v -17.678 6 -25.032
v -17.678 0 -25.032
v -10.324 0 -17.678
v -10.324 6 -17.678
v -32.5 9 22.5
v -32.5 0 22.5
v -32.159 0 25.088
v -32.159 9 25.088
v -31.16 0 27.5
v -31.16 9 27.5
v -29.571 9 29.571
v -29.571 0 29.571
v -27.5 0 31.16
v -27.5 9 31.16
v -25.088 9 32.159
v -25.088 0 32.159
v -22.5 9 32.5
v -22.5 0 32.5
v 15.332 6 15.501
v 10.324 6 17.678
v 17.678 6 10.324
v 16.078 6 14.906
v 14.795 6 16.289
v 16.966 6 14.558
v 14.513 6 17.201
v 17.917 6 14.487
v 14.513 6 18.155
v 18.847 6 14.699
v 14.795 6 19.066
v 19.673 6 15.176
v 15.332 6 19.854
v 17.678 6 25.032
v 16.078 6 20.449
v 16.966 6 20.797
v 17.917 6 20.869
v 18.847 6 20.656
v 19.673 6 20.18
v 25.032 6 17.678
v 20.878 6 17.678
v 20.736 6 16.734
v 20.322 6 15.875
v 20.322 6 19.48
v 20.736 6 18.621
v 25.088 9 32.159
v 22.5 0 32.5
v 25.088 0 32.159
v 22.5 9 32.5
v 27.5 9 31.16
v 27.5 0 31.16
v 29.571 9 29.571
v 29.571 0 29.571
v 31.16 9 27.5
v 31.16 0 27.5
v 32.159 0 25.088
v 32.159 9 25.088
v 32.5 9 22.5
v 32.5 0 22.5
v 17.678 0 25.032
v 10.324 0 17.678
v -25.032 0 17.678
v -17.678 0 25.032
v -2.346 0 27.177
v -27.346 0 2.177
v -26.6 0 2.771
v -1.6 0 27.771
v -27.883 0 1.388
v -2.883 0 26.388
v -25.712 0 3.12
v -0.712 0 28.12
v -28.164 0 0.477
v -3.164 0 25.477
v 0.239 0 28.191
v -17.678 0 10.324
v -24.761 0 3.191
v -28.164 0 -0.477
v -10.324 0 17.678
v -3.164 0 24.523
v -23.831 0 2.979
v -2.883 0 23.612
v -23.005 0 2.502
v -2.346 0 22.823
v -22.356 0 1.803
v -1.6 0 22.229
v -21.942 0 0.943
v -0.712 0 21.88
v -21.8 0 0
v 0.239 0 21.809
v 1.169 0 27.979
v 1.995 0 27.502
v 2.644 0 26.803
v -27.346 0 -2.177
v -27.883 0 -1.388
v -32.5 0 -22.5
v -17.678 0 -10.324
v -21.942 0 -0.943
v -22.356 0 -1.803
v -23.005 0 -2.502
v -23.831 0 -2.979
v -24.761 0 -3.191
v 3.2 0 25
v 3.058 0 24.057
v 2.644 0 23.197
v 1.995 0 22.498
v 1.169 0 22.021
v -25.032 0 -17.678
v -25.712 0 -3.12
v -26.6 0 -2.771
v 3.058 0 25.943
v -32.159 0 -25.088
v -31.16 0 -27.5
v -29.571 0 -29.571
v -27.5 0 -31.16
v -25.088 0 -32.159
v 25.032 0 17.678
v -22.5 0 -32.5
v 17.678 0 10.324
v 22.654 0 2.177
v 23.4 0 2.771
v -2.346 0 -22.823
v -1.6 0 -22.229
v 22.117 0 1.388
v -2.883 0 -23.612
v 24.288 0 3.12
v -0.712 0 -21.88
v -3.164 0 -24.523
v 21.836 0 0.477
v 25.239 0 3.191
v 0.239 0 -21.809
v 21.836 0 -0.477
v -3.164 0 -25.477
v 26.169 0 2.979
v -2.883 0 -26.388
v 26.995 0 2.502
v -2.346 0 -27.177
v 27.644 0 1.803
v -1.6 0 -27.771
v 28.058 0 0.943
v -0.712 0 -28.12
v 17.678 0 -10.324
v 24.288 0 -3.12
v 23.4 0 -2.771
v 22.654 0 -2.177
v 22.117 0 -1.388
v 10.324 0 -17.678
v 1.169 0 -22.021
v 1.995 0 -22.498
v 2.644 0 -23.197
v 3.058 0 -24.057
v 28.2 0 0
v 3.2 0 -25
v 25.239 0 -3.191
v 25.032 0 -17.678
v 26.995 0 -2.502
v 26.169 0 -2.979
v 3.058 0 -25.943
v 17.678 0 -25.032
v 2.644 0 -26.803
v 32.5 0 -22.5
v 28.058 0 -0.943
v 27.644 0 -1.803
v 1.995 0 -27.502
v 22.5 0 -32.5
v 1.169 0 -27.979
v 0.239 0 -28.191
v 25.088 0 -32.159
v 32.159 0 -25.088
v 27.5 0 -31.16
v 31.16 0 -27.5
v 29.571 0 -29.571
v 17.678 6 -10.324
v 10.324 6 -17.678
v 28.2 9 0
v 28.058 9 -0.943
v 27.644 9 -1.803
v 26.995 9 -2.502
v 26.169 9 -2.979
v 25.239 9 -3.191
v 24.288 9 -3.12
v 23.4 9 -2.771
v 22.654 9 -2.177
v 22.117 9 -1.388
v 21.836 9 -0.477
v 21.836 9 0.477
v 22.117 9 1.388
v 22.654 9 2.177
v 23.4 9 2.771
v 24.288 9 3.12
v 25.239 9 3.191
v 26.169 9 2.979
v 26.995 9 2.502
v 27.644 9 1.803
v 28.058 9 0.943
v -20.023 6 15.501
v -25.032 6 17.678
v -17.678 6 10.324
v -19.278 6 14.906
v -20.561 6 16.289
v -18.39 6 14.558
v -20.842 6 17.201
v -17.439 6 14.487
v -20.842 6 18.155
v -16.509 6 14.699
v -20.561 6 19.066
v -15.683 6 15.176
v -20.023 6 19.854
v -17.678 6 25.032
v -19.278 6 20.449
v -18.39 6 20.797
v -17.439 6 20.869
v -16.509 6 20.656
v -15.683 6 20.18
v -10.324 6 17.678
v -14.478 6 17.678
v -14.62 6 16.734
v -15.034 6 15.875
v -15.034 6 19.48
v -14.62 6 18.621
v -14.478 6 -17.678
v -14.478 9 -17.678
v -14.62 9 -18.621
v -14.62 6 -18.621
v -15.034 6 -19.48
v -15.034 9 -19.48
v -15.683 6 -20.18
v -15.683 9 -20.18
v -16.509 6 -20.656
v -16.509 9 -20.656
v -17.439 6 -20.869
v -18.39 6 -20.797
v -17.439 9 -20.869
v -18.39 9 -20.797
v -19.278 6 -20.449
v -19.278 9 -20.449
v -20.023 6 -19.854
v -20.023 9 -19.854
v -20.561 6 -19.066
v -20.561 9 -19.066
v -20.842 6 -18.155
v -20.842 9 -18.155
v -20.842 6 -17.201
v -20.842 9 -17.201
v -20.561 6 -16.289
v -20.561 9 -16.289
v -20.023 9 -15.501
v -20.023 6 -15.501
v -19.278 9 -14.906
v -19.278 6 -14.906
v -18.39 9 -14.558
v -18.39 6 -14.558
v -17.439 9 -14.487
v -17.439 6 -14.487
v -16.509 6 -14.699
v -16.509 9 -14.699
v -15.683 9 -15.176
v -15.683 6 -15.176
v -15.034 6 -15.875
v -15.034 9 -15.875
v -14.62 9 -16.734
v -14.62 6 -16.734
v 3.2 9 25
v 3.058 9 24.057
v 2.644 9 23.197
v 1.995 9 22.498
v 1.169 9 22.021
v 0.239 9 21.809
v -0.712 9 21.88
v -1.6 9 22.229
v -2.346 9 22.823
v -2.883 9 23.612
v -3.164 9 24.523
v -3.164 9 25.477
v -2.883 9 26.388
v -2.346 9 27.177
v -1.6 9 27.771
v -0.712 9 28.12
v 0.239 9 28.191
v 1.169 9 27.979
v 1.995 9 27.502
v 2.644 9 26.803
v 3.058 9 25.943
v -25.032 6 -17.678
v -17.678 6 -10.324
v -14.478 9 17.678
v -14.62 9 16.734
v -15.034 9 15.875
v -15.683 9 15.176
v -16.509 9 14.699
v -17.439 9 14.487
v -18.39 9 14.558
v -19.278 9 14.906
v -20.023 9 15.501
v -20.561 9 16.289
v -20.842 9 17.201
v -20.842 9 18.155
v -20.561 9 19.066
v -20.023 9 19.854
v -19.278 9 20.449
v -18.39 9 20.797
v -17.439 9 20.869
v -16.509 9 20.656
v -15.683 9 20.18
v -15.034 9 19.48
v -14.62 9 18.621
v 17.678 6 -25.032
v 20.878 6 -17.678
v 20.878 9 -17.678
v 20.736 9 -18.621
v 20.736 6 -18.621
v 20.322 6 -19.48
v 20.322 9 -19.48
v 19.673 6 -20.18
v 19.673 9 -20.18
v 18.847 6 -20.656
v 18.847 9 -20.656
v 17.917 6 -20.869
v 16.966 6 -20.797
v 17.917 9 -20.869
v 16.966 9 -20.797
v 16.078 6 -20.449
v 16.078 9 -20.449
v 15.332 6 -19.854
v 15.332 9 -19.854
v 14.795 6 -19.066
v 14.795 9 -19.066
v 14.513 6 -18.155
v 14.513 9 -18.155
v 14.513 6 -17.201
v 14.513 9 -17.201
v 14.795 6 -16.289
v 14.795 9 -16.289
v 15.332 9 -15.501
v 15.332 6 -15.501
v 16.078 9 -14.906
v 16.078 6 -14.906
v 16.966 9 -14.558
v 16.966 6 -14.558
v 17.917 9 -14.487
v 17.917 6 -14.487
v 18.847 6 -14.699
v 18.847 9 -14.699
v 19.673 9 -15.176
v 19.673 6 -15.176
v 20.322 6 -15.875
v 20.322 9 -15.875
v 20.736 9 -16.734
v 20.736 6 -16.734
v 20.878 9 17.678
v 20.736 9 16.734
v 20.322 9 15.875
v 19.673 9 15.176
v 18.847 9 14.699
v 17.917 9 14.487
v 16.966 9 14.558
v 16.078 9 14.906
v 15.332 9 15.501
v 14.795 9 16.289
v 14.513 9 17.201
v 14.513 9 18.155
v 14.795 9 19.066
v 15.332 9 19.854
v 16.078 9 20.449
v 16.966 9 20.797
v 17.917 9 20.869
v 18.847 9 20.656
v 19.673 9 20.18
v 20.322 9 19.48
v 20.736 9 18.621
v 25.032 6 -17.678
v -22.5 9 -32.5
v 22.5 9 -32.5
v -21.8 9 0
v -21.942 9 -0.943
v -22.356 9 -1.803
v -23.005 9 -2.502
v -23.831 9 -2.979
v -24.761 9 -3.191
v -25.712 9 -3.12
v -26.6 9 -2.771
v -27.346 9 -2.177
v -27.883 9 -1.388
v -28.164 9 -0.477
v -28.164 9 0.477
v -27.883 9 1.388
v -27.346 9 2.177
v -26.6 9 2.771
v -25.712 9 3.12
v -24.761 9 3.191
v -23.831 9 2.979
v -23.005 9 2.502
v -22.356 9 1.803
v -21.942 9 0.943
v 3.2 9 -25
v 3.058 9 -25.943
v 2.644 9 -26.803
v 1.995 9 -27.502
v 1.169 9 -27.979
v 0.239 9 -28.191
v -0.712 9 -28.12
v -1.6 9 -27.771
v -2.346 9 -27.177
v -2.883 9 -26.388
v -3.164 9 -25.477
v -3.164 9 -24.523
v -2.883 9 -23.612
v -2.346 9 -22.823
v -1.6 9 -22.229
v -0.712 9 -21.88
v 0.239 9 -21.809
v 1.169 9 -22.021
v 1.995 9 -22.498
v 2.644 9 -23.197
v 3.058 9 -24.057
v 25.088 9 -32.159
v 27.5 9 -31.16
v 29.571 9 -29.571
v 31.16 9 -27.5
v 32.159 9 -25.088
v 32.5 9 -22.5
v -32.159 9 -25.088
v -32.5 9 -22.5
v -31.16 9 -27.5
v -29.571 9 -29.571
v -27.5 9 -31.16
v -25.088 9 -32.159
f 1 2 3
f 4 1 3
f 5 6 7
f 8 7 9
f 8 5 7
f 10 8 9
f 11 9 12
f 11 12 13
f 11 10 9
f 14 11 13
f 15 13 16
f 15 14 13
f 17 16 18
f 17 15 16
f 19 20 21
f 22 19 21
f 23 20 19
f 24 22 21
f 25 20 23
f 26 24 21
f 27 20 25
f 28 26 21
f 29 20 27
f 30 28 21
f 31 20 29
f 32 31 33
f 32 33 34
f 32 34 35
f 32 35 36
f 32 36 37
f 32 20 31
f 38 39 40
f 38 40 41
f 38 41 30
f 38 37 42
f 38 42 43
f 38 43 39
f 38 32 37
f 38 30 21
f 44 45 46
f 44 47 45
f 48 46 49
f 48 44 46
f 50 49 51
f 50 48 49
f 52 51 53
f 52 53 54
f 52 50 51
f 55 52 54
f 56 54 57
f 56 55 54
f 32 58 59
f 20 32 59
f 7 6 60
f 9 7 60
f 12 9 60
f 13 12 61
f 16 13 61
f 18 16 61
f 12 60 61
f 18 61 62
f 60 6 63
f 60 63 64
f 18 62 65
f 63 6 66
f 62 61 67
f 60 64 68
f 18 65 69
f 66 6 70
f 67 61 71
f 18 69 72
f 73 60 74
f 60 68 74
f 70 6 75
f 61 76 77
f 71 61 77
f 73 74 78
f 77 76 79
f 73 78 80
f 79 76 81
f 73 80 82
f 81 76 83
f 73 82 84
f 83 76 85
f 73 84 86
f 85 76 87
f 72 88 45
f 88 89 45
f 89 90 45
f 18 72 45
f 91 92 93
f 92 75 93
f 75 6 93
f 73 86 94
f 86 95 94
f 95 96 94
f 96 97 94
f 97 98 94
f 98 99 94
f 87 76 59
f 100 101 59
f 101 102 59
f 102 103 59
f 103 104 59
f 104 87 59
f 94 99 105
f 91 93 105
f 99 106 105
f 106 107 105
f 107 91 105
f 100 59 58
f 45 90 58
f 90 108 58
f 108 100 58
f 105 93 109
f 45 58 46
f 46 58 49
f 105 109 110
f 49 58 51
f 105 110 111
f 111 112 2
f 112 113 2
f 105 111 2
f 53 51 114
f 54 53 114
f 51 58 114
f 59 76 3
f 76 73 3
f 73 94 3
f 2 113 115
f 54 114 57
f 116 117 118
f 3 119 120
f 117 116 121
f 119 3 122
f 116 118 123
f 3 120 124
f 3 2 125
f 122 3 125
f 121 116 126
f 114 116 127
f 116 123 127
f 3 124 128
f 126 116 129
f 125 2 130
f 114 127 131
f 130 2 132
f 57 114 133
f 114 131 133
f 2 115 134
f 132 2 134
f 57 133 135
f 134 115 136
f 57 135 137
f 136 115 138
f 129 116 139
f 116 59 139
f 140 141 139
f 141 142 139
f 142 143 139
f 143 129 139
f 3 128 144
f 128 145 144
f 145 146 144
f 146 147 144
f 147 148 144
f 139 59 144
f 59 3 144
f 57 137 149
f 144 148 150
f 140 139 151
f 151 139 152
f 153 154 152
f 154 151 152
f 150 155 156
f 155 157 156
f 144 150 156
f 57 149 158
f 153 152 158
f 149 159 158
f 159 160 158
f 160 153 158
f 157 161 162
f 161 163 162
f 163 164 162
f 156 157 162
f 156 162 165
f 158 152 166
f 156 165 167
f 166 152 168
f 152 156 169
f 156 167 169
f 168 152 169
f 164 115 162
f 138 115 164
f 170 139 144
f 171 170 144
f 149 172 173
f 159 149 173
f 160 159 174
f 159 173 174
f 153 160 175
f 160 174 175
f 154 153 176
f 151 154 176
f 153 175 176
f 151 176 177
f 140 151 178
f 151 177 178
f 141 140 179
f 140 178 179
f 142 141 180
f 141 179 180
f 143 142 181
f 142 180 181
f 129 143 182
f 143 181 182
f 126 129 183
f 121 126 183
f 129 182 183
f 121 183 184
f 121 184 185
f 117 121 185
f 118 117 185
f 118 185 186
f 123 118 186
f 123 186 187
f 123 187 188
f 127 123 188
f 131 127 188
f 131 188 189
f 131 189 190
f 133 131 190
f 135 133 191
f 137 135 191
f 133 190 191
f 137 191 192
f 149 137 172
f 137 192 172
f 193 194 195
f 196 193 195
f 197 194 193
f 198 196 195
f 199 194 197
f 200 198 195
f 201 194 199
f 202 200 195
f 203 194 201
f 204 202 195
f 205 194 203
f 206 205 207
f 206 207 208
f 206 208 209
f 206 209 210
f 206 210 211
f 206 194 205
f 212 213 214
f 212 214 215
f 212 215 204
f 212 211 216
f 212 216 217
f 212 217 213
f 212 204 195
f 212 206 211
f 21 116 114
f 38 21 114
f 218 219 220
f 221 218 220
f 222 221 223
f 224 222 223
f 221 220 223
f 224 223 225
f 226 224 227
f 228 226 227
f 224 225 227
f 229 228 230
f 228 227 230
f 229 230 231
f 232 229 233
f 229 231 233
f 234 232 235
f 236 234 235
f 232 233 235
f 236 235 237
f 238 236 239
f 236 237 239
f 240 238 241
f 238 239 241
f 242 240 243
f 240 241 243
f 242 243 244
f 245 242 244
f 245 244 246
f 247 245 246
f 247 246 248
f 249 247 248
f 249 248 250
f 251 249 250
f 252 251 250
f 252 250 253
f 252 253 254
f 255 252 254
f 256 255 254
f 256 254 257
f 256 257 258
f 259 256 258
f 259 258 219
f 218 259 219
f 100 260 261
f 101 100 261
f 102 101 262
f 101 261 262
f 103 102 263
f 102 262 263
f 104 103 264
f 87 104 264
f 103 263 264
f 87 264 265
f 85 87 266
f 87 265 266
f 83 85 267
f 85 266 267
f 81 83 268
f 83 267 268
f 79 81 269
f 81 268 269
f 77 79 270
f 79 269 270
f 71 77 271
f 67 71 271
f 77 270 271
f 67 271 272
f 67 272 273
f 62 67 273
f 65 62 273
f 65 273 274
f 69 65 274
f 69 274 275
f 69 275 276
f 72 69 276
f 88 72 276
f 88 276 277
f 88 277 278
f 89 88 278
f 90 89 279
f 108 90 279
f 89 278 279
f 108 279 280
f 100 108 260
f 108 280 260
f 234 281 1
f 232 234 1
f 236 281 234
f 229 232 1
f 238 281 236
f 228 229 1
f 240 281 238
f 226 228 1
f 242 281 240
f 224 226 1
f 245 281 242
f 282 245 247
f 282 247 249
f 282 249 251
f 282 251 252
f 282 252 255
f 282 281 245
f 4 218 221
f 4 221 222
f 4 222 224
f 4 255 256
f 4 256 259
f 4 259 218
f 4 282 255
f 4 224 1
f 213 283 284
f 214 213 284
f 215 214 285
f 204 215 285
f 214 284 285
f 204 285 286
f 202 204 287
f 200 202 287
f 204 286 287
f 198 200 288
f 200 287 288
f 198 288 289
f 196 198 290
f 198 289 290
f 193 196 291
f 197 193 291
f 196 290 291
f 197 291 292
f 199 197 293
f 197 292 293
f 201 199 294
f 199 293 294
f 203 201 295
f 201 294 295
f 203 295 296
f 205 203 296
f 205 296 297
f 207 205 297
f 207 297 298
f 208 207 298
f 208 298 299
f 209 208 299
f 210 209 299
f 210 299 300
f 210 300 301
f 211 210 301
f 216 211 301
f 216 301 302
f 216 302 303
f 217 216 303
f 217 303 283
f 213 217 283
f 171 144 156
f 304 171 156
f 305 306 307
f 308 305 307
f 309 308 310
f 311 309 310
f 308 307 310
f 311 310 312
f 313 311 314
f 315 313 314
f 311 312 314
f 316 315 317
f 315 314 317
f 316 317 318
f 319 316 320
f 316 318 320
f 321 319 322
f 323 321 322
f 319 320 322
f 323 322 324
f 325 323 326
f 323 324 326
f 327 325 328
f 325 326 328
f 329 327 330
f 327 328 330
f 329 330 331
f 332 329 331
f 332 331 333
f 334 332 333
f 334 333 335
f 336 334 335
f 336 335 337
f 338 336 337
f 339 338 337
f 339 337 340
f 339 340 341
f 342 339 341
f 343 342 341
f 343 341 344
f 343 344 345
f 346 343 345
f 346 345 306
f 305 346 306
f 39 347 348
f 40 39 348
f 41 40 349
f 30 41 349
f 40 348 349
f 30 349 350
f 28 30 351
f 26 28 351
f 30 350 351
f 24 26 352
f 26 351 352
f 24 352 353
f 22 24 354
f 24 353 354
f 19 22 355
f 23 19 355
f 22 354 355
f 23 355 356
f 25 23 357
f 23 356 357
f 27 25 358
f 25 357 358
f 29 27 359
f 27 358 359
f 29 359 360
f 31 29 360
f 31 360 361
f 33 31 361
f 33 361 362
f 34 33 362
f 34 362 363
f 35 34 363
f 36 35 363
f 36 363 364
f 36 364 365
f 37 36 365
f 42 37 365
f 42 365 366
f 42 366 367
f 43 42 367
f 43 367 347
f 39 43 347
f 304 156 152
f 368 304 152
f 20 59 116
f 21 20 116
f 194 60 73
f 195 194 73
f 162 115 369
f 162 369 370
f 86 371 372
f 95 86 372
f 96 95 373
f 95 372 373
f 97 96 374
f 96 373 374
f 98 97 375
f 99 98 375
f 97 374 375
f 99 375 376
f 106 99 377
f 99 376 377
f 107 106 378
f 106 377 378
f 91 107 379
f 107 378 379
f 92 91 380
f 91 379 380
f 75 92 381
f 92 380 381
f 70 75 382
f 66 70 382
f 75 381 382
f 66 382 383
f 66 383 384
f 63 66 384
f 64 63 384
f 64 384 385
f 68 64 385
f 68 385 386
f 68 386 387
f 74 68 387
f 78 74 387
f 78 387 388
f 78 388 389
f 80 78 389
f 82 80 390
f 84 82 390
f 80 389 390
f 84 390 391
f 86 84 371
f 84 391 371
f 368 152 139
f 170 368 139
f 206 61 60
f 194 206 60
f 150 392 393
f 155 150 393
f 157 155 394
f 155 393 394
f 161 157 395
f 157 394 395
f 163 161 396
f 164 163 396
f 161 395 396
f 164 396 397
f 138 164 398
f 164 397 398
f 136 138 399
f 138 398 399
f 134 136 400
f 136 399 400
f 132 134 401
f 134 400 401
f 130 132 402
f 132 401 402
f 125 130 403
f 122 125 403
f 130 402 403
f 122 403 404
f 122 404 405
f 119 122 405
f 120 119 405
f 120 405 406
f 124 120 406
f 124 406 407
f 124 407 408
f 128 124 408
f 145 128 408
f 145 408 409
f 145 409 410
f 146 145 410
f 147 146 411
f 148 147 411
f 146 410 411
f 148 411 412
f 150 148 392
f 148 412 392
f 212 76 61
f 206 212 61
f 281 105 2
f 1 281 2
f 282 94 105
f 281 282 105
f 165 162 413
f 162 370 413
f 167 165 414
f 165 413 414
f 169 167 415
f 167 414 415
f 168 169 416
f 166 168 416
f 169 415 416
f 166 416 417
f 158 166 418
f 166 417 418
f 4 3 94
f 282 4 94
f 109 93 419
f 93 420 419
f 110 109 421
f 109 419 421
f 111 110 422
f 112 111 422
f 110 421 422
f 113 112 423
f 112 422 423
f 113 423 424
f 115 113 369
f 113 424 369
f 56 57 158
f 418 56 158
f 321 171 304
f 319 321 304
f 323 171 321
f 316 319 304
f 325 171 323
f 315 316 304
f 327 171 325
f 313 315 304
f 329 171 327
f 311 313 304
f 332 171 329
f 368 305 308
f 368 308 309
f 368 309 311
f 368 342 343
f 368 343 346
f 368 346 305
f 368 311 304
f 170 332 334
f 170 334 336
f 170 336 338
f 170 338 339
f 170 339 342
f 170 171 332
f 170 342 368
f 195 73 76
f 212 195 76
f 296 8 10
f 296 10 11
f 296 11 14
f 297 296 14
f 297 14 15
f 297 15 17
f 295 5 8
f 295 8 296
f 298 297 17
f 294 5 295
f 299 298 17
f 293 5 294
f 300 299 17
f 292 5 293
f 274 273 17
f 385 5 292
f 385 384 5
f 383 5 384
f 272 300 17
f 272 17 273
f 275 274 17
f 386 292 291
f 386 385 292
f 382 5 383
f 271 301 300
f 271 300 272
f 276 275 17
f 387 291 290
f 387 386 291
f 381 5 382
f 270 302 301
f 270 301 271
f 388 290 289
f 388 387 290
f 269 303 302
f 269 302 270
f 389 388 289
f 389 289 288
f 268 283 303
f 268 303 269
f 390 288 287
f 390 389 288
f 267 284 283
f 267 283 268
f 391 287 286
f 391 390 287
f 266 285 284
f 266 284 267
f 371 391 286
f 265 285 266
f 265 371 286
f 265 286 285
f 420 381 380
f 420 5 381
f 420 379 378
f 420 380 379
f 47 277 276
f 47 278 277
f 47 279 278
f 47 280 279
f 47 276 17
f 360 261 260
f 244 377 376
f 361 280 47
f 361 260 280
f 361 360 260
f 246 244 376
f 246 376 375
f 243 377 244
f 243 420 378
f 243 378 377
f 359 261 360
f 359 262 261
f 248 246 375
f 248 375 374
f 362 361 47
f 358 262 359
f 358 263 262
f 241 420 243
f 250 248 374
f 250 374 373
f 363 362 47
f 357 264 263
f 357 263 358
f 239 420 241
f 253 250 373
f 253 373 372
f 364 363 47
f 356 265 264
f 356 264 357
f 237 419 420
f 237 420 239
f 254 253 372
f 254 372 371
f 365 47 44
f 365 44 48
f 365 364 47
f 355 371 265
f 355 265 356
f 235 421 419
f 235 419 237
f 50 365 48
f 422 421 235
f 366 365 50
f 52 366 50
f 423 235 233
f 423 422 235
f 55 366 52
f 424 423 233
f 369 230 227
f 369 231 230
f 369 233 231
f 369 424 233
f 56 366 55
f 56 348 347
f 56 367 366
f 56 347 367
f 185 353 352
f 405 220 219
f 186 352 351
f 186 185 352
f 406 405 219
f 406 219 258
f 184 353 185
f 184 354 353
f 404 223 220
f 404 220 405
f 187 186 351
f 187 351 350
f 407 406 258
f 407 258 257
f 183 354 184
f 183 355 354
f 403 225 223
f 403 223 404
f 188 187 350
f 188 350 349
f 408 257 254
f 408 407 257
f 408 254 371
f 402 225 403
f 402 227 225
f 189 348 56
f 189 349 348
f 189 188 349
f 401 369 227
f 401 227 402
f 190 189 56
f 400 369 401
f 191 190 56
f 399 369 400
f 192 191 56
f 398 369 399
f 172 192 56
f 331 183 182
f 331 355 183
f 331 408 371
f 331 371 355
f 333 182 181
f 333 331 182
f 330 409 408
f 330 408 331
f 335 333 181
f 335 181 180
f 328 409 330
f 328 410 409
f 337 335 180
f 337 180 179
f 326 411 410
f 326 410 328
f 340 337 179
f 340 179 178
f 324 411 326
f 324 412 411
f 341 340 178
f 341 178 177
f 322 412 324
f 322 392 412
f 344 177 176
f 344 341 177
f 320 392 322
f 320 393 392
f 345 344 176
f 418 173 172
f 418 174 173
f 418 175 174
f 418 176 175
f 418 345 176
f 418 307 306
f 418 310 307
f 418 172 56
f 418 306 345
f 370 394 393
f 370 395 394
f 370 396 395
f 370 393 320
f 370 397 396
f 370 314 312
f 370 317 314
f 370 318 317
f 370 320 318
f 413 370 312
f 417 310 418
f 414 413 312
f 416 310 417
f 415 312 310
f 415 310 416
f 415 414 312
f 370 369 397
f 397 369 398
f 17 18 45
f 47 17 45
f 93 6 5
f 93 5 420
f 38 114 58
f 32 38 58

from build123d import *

# Parameters (mm, degrees)
SKETCH_1_W          = 65
SKETCH_1_H          = 65
EXTRUDE_1_DEPTH     = 9
SKETCH_2_R          = 3.2
CUT_EXTRUDE_1_DEPTH = 9
CUT_EXTRUDE_2_DEPTH = 6
FILLET_1_R          = 10


with BuildPart() as part:
    # 스케치1 → 보스-돌출1 (new body)
    with BuildSketch(Plane(origin=(0, 0, 0), x_dir=(1, 0, 0), z_dir=(0, 1, 0))):
        Rectangle(SKETCH_1_W, SKETCH_1_H)
    extrude(amount=EXTRUDE_1_DEPTH)

    # 스케치2 → 컷-돌출1 (cut)
    with BuildSketch(Plane(origin=(0, 9, 0), x_dir=(1, 0, 0), z_dir=(0, 1, 0))):
        with Locations((-17.67766953, 17.67766953)):
            Circle(SKETCH_2_R)
        with Locations((17.67766953, -17.67766953)):
            Circle(SKETCH_2_R)
        with Locations((-17.67766953, -17.67766953)):
            Circle(SKETCH_2_R)
        with Locations((17.67766953, 17.67766953)):
            Circle(SKETCH_2_R)
        with Locations((0, 25)):
            Circle(SKETCH_2_R)
        with Locations((25, 0)):
            Circle(SKETCH_2_R)
        with Locations((0, -25)):
            Circle(SKETCH_2_R)
        with Locations((-25, 0)):
            Circle(SKETCH_2_R)
    extrude(amount=-CUT_EXTRUDE_1_DEPTH, mode=Mode.SUBTRACT)

    # 스케치3 → 컷-돌출2 (cut)
    with BuildSketch(Plane.XZ):
        Polygon((-25.031580054, 17.67766953), (-17.67766953, 10.323759005), (-10.323759005, 17.67766953), (-17.67766953, 25.031580054), align=None)
        Polygon((10.323759005, 17.67766953), (17.67766953, 10.323759005), (25.031580054, 17.67766953), (17.67766953, 25.031580054), align=None)
        Polygon((10.323759005, -17.67766953), (17.67766953, -25.031580054), (25.031580054, -17.67766953), (17.67766953, -10.323759005), align=None)
        Polygon((-25.031580054, -17.67766953), (-17.67766953, -25.031580054), (-10.323759005, -17.67766953), (-17.67766953, -10.323759005), align=None)
    extrude(amount=-CUT_EXTRUDE_2_DEPTH, mode=Mode.SUBTRACT)

    # 필렛1
    fillet_1_edges = [part.edges().sort_by_distance(p)[0] for p in [
        (-32.5, 4.5, -32.5),
        (32.5, 4.5, -32.5),
        (32.5, 4.5, 32.5),
        (-32.5, 4.5, 32.5),
    ]]
    fillet(fillet_1_edges, radius=FILLET_1_R)


solid = part.part
